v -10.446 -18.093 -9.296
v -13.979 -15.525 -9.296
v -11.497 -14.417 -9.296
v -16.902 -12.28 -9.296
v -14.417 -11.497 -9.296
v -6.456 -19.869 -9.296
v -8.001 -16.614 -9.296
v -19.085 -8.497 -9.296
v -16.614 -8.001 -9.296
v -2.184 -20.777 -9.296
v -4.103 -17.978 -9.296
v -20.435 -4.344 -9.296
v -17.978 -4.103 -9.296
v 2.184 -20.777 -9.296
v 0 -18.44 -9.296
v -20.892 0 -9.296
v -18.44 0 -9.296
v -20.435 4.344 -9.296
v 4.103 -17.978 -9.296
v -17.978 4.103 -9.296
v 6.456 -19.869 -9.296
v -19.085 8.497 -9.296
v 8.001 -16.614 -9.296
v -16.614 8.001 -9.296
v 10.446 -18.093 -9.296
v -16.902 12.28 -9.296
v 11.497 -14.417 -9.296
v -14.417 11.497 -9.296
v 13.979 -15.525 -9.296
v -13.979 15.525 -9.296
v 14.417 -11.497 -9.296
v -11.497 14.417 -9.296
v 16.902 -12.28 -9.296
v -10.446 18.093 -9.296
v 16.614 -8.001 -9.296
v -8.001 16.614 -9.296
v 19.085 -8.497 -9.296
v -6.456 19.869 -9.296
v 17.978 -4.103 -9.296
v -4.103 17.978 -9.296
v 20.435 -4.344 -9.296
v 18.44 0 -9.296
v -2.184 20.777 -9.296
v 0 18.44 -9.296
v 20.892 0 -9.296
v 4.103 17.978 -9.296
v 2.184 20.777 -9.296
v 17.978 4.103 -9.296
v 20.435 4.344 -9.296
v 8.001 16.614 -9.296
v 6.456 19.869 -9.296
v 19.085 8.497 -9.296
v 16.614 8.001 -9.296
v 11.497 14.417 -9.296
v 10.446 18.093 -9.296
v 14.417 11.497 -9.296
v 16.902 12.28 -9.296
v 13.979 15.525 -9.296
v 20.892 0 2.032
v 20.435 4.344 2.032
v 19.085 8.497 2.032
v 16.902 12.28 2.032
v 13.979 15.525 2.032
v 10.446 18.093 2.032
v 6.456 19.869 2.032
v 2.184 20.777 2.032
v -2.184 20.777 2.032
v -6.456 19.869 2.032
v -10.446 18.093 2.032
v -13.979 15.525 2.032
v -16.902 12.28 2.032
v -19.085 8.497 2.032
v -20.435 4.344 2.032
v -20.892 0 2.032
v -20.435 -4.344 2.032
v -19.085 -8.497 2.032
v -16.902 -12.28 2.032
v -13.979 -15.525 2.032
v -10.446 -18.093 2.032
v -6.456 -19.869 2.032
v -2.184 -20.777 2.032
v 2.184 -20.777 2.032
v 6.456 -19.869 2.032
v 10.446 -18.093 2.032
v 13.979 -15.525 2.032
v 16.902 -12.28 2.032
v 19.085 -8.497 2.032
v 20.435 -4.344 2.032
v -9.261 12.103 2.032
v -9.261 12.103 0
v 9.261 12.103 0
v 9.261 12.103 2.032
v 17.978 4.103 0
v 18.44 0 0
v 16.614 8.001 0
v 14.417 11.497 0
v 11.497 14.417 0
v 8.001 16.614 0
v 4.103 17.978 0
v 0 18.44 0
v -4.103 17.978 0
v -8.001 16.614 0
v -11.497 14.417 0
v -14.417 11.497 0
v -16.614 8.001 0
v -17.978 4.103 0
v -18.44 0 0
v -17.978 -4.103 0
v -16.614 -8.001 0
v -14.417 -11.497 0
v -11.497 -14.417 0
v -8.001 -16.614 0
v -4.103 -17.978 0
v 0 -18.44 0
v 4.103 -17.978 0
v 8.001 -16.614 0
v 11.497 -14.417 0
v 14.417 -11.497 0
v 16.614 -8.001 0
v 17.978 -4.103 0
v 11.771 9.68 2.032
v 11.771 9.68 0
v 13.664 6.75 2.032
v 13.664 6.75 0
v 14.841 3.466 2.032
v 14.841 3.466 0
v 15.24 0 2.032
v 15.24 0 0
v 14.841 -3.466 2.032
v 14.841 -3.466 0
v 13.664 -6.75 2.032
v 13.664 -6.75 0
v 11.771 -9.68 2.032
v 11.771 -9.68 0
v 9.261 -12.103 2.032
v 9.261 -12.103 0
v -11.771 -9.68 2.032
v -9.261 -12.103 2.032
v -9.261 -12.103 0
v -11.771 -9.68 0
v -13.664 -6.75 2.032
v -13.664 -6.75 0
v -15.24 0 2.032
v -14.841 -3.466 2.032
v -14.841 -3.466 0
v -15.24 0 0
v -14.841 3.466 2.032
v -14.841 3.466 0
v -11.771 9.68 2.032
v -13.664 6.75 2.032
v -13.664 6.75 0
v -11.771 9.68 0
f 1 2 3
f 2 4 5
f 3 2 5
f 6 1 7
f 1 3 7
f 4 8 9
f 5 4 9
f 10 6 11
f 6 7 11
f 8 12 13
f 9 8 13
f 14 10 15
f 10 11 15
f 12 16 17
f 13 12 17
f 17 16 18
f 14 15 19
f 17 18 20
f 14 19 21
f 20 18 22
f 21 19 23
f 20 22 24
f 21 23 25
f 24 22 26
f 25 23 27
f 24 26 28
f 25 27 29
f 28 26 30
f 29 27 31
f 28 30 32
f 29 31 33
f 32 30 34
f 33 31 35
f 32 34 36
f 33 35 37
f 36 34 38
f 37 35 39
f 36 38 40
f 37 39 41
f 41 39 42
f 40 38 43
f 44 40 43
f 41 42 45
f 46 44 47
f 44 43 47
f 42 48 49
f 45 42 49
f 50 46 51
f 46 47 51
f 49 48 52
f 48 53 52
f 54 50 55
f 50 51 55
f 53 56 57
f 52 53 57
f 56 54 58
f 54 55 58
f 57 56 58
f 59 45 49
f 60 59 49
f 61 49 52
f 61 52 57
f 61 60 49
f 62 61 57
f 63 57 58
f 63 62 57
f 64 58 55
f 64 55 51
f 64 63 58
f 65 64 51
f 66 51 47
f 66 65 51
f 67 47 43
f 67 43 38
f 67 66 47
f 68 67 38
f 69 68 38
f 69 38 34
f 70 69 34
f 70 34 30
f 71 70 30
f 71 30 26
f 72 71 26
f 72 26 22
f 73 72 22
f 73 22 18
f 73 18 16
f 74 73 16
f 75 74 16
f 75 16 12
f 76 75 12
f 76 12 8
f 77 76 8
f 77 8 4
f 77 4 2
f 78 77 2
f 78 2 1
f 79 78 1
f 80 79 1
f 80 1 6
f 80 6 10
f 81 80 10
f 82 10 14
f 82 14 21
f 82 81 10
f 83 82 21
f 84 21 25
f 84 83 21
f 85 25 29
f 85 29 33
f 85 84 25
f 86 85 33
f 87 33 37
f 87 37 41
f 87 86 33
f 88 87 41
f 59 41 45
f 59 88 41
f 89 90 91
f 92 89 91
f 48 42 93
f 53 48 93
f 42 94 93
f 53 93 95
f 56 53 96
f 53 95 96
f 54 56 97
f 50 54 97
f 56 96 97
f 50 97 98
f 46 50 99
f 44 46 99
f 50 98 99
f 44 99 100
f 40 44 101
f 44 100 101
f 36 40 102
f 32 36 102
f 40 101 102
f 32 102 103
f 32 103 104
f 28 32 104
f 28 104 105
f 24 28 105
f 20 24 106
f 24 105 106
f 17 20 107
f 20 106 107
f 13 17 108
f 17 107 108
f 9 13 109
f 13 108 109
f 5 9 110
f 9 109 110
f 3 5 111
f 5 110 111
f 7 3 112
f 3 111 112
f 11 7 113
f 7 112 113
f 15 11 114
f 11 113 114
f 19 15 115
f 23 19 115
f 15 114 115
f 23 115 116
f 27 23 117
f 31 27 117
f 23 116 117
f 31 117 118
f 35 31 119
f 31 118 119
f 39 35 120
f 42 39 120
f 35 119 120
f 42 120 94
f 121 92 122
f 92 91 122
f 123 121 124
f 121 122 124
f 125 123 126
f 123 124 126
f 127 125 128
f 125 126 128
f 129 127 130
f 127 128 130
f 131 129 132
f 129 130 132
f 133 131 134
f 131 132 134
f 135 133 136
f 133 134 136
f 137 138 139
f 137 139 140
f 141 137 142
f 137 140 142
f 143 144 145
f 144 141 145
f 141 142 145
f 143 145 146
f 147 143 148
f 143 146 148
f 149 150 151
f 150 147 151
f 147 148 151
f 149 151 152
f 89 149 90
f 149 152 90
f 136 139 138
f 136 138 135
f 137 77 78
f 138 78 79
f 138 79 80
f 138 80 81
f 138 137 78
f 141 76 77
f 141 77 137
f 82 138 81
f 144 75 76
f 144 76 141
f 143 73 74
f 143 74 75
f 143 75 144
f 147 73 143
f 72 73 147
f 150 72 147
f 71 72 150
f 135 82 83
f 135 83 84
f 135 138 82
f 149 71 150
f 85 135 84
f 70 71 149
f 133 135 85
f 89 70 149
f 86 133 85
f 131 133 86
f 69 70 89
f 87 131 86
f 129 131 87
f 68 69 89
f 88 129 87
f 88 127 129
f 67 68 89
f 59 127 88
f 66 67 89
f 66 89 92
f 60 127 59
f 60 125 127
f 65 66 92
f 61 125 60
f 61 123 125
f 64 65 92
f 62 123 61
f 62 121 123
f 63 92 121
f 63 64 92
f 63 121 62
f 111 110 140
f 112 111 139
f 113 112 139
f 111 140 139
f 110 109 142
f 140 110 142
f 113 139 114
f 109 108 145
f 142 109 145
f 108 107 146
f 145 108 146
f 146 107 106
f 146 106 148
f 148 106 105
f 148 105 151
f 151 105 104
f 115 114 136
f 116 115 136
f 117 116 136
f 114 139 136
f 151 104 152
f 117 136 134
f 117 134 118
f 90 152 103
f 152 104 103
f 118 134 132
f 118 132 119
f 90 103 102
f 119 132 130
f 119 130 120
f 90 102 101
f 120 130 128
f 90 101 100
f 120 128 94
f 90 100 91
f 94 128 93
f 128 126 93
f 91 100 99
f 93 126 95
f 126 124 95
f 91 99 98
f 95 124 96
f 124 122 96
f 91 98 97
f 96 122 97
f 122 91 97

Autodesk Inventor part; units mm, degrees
ref_plane "YZ Plane" through (0, 0, 0) normal (1, 0, 0) x (0, 1, 0)
ref_plane "XZ Plane" through (0, 0, 0) normal (0, 1, 0) x (-1, 0, 0)
ref_plane "XY Plane" through (0, 0, 0) normal (0, 0, 1) x (1, 0, 0)
sketch "Sketch1" plane through (0, 0, 0) normal (0, 0, 1) x (1, 0, 0)
  circle A0 centre (0, 0) radius 20.8915
  circle A1 centre (0, 0) radius 15.24
  line L0 (-9.2613, 12.1031) -> (9.2613, 12.1031)
  line L1 (-9.2613, -12.1031) -> (9.2613, -12.1031)
  circle A2 centre (0, 0) radius 18.4404
  dimension "d0" = 41.783
  dimension "d1" = 30.48
  dimension "d2" = 12.1031
  dimension "d3" = 12.1031
  dimension "d4" = 36.8808
extrude "Extrusion1" add sketch "Sketch1" against normal blind 9.2964 contours A0
extrude "Extrusion2" add sketch "Sketch1" along normal blind 2.032 contours A0 | L0 A1 | A1 L1 | A2
thread "Thread1" size "1 11/16-6 UN" class "2A" standard "ANSI Unified Screw Threads" full length
equation "\"d3\" = d2"
properties part number "Spring torque cap"
